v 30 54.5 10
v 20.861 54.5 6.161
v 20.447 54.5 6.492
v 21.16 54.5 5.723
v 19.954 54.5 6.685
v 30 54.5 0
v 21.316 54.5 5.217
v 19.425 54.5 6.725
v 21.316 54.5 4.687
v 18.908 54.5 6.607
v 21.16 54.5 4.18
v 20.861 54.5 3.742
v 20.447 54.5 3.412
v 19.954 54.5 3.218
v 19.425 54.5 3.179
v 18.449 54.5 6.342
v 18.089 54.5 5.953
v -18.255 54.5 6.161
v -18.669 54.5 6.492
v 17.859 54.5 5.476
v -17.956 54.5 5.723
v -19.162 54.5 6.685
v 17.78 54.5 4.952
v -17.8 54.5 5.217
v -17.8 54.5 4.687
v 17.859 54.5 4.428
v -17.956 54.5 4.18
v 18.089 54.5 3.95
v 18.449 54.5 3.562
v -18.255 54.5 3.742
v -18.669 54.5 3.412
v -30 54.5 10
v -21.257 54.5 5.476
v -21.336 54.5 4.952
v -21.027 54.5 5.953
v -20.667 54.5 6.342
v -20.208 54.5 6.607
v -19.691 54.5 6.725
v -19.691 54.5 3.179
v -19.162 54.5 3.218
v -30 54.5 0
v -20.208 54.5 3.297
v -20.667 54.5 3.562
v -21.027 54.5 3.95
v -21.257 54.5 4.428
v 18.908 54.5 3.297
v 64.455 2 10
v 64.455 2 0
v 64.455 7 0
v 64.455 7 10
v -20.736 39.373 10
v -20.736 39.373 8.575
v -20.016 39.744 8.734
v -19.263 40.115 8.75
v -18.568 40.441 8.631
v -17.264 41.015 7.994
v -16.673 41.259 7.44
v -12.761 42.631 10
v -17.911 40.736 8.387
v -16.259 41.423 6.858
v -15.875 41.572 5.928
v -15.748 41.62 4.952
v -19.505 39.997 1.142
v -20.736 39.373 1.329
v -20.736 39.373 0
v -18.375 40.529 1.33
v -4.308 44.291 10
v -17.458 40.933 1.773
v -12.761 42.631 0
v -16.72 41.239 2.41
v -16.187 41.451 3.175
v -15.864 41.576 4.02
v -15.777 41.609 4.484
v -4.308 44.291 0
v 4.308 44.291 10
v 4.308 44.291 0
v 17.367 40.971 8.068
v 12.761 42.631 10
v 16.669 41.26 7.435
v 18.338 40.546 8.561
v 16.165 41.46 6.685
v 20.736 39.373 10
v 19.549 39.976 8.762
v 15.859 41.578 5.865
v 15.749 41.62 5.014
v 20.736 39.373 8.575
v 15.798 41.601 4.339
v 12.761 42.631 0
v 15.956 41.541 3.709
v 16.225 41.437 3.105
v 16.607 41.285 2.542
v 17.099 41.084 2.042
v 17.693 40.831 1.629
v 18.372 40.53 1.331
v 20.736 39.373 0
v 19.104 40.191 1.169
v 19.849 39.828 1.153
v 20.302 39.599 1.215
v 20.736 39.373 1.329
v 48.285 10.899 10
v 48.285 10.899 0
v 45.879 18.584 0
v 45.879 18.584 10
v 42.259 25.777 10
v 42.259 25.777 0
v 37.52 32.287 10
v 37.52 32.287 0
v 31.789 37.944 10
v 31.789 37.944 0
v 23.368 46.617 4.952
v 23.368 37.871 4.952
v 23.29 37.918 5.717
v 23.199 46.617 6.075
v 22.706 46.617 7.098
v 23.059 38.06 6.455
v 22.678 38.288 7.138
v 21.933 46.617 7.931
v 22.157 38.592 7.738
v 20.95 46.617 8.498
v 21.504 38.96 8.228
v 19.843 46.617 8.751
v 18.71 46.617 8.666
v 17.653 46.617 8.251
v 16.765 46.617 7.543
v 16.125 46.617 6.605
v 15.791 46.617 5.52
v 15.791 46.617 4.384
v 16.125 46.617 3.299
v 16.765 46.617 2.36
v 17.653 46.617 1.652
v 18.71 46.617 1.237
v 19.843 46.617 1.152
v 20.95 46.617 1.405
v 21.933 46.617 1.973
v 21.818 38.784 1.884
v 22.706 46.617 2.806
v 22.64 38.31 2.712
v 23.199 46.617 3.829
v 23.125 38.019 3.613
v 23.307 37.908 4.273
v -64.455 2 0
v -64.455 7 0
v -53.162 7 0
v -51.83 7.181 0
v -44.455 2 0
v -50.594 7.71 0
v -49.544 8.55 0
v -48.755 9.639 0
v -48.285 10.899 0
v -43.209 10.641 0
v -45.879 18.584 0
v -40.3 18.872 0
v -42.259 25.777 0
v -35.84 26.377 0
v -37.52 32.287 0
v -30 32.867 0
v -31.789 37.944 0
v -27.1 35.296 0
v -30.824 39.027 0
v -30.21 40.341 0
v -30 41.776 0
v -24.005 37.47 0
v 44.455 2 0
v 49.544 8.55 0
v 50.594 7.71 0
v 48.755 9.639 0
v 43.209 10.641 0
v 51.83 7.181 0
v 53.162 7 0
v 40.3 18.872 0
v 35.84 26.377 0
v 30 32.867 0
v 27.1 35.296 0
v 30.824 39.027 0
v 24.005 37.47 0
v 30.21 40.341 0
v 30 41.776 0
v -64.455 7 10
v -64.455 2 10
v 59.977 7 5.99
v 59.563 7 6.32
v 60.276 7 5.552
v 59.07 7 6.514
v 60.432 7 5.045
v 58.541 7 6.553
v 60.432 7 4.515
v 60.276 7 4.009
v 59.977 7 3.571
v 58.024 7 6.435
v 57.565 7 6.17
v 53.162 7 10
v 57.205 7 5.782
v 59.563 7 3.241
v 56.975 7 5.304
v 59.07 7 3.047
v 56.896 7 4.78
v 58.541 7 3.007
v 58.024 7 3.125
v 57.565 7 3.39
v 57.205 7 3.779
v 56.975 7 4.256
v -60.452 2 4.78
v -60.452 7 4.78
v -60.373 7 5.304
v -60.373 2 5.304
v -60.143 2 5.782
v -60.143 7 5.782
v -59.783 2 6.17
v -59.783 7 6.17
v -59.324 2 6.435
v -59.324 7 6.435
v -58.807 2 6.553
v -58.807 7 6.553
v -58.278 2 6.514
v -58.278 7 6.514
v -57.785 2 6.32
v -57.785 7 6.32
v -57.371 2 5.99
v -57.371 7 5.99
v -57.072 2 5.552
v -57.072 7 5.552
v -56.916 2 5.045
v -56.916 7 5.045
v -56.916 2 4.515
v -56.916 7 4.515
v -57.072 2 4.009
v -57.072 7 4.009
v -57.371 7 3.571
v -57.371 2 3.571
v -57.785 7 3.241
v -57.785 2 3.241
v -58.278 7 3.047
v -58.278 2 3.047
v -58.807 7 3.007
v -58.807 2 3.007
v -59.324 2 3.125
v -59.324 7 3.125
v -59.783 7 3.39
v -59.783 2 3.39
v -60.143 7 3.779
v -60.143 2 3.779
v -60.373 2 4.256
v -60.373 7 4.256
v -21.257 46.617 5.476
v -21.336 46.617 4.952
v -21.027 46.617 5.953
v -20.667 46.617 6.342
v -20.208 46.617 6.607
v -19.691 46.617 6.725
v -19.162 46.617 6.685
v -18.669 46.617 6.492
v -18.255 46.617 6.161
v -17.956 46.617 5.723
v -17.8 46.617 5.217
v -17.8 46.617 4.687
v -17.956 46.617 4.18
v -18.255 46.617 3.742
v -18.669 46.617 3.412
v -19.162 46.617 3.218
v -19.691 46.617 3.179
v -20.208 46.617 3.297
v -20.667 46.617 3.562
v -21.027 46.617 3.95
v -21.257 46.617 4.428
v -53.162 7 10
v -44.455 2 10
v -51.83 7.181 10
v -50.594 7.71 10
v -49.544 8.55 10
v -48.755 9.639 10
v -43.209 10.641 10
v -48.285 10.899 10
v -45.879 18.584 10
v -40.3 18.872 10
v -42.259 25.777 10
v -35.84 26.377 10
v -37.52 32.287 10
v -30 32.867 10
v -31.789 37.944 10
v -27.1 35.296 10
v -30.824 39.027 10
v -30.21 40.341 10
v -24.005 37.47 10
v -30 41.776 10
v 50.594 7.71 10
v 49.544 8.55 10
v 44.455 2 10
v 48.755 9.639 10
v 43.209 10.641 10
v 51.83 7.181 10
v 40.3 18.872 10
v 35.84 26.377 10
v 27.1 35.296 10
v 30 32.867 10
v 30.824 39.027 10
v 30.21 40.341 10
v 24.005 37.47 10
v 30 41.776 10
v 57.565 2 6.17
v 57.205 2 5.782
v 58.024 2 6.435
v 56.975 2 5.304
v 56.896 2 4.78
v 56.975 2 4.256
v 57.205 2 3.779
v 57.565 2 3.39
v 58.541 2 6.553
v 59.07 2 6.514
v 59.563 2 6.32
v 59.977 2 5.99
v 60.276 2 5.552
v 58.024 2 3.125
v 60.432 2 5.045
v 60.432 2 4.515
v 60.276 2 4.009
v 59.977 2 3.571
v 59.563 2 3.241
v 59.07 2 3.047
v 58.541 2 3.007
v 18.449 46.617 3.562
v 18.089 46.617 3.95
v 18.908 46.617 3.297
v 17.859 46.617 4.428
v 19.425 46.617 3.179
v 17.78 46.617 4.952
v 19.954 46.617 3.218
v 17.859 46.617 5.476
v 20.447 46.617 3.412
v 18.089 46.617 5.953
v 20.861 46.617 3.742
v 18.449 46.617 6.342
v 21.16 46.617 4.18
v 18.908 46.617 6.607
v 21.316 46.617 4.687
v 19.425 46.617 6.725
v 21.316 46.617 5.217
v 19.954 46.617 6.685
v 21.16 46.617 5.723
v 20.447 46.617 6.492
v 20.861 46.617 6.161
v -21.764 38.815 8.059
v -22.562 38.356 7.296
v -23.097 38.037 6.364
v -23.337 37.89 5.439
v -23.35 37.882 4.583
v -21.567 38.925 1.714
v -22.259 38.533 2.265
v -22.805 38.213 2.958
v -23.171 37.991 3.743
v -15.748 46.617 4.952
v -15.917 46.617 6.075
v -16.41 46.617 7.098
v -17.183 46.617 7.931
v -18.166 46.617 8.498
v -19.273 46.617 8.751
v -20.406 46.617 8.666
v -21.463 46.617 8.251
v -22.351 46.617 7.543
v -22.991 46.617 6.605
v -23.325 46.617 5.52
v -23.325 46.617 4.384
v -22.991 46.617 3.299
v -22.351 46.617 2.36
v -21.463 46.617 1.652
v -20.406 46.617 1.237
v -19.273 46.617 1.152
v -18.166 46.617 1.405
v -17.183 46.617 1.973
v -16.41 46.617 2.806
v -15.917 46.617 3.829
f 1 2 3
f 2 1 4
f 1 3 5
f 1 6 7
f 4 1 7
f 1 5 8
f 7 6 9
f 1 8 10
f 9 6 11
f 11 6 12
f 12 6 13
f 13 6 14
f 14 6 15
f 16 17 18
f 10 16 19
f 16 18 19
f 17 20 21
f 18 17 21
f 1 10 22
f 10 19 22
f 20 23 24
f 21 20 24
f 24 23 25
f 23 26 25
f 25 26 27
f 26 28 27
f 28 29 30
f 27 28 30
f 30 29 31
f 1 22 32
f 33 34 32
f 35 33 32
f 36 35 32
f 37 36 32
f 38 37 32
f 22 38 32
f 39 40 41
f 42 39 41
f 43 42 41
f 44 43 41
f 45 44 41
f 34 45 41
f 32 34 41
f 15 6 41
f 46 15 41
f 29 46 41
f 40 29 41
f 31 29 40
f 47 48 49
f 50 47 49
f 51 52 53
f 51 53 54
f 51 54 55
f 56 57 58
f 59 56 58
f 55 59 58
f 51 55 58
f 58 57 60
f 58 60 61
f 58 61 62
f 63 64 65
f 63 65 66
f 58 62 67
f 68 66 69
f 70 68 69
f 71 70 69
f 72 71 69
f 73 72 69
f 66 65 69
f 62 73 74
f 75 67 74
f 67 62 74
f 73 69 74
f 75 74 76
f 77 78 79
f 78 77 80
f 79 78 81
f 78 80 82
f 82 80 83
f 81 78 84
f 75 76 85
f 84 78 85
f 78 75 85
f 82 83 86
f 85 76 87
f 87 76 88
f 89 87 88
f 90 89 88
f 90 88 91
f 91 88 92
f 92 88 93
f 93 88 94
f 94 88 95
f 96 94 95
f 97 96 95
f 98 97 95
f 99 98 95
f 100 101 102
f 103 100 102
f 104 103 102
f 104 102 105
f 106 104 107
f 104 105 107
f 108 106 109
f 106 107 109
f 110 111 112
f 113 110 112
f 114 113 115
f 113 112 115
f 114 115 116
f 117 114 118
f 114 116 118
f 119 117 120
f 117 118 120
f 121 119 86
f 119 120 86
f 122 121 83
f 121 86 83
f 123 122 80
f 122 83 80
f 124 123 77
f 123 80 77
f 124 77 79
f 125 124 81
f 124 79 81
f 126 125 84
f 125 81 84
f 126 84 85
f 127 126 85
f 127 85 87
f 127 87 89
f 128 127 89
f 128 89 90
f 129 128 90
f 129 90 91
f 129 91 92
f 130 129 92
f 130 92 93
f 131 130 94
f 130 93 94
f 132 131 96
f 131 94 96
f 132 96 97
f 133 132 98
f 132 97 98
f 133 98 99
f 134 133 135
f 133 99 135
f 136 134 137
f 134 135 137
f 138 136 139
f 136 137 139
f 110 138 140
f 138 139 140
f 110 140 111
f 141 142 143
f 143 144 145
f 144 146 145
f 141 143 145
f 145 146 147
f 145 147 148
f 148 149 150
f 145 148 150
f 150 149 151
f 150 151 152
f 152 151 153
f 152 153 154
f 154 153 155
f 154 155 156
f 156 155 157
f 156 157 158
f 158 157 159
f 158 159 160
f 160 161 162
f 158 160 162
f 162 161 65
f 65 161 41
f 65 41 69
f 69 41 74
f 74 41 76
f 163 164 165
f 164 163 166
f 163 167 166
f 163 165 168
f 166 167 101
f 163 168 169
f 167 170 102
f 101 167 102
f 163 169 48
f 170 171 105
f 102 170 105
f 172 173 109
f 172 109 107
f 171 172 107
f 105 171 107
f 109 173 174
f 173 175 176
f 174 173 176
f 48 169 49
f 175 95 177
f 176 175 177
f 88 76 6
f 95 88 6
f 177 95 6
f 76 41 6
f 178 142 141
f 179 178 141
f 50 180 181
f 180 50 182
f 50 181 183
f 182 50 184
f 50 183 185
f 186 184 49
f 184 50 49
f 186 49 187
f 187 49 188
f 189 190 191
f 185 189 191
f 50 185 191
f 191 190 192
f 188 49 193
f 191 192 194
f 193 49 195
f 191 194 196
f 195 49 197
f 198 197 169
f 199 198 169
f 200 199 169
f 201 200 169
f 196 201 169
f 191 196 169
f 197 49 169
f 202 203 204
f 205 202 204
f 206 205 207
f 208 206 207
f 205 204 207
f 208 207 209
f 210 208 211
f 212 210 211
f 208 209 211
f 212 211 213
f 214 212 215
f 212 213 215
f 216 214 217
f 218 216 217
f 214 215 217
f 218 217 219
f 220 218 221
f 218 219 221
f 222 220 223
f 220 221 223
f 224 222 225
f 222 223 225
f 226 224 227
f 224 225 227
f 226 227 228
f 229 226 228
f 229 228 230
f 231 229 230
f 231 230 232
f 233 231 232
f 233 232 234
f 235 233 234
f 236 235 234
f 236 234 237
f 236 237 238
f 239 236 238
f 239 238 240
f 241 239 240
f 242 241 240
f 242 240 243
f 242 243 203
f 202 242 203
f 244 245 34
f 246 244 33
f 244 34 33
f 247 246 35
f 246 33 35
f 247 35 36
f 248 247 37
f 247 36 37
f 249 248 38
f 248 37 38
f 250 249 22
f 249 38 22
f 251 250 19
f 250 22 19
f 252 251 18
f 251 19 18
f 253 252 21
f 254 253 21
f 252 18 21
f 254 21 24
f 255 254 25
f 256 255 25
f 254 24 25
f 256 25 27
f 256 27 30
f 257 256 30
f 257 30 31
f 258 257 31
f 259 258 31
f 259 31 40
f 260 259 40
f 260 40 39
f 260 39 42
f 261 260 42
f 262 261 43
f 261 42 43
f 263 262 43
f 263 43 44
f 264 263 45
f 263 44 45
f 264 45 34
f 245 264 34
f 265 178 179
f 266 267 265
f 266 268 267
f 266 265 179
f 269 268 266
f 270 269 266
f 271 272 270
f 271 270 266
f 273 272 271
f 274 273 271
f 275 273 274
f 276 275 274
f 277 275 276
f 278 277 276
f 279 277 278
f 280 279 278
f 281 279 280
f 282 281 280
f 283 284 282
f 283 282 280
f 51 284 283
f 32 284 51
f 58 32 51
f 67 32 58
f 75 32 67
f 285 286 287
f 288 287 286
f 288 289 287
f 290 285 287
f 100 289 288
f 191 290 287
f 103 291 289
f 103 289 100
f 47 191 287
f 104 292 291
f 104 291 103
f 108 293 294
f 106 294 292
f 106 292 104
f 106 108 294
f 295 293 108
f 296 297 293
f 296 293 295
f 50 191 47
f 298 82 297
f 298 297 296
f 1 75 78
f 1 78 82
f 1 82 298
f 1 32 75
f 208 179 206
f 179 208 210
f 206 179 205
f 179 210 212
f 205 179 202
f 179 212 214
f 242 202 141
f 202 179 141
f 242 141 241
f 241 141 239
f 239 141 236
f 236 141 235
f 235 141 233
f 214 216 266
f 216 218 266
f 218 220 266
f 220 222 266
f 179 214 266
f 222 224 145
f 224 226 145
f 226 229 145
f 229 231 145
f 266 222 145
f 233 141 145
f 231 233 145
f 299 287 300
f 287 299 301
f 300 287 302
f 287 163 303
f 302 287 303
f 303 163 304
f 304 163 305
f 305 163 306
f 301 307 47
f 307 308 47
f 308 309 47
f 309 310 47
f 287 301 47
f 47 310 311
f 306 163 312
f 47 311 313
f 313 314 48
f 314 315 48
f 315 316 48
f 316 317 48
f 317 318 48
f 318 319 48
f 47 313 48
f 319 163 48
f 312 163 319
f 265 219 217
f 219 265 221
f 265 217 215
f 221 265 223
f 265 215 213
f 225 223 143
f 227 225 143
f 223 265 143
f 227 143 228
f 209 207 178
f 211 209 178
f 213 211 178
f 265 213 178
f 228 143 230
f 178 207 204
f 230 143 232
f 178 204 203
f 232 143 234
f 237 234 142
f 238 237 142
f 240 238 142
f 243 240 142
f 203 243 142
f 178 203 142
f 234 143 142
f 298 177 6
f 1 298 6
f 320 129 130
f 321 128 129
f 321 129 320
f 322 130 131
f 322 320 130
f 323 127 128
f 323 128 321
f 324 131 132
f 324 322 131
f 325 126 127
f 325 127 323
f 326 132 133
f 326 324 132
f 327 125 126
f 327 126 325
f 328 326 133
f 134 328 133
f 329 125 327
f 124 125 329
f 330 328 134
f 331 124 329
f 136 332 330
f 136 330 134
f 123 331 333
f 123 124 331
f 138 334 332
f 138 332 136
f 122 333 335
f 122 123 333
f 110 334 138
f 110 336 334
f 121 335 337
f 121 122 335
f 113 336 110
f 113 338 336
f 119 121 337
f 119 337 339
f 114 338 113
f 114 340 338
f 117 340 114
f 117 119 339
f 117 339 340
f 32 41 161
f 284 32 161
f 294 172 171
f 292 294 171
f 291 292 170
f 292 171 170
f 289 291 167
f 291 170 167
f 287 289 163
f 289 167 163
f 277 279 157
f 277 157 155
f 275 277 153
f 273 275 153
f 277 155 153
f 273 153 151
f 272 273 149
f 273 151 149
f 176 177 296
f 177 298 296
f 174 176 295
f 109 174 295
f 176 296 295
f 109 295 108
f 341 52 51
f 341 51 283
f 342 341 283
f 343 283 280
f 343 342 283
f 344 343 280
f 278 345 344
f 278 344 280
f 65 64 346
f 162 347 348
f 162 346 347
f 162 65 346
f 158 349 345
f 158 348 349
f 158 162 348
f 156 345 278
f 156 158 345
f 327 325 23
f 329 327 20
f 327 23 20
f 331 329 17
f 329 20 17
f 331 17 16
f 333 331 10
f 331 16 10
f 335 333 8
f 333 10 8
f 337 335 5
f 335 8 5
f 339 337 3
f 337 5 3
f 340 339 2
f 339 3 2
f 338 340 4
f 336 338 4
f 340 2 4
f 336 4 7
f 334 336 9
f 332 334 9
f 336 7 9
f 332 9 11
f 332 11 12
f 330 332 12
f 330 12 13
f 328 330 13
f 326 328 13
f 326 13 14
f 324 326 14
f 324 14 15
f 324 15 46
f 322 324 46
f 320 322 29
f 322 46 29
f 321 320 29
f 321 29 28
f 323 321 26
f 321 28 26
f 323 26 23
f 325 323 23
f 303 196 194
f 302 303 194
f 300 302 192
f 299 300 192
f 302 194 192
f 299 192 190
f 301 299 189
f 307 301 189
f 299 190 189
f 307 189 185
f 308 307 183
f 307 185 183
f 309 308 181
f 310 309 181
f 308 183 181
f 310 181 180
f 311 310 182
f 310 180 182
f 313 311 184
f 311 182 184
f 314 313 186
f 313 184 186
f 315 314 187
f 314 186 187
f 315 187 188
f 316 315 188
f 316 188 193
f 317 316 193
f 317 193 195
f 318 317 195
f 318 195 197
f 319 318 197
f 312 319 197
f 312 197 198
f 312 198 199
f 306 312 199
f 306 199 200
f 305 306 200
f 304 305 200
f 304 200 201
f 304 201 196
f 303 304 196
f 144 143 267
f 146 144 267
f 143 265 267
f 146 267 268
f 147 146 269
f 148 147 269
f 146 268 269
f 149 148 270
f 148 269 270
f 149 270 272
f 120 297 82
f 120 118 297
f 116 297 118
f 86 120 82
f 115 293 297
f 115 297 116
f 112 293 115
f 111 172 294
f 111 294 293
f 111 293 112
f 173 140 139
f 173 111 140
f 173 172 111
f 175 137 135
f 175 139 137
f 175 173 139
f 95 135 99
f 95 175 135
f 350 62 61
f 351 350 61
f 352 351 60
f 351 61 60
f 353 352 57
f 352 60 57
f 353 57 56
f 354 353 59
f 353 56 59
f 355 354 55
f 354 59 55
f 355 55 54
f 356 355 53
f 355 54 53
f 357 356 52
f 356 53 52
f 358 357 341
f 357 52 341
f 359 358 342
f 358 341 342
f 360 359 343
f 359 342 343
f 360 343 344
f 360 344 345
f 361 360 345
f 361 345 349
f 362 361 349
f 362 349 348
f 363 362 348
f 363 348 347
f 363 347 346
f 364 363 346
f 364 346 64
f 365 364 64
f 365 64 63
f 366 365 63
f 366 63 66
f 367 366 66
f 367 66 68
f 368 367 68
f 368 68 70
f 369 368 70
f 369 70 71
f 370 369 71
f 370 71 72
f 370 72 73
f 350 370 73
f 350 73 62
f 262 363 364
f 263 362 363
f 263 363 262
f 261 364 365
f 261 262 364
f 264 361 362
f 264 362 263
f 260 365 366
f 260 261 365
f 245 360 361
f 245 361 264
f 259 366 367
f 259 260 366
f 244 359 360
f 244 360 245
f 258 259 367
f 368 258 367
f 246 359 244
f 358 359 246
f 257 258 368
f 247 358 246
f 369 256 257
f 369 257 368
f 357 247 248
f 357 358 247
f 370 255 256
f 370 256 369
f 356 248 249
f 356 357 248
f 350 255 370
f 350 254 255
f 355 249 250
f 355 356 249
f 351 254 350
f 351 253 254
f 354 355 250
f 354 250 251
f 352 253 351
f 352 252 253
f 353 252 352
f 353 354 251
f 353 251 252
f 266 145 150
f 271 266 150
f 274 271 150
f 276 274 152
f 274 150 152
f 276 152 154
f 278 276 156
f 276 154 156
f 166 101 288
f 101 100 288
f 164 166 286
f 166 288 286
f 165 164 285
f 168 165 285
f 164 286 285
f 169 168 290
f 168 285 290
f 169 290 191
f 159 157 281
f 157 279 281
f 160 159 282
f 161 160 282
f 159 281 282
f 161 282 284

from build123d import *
from build123d import SkipClean  # not in build123d's __all__

# Parameters (mm, degrees)
F1_DEPTH       = 10
F3_D           = 3.556
F3_CBORE_D     = 7.62
F3_CBORE_DEPTH = 13.75
F4_DEPTH       = 10.0010001
F6_D           = 3.556
F7_R           = 5


with BuildPart() as f1:
    # F0 (on Top) → F1 (new body)
    with BuildSketch(Plane.XY):
        with BuildLine():
            ThreePointArc((30, 32.8671568591), (40.2999174323, 18.8723780946), (44.4550334608, 2))
            Line((44.4550334608, 2), (44.4550334608, 7))
            Line((44.4550334608, 7), (49.002550954, 7))
            ThreePointArc((49.002550954, 7), (42.6890737127, 25.0577929106), (30, 39.3732142452))
            Line((30, 39.3732142452), (30, 32.8671568591))
        make_face()
        with BuildLine():
            ThreePointArc((20.7364413533, 39.3732142452), (25.5759421328, 36.4159468368), (30, 32.8671568591))
            Line((30, 32.8671568591), (30, 39.3732142452))
            Line((30, 39.3732142452), (20.7364413533, 39.3732142452))
        make_face()
        with BuildLine():
            ThreePointArc((-20.7364413533, 39.3732142452), (0, 44.5), (20.7364413533, 39.3732142452))
            Line((20.7364413533, 39.3732142452), (30, 39.3732142452))
            ThreePointArc((30, 39.3732142452), (15.8315491079, 46.9000218853), (-1.83e-08, 49.5))
            ThreePointArc((-1.83e-08, 49.5), (-15.8315491253, 46.9000218795), (-30, 39.3732142452))
            Line((-30, 39.3732142452), (-20.7364413533, 39.3732142452))
        make_face()
        with BuildLine():
            Line((-30, 39.3732142452), (-30, 32.8671568591))
            ThreePointArc((-30, 32.8671568591), (-25.5759421328, 36.4159468368), (-20.7364413533, 39.3732142452))
            Line((-20.7364413533, 39.3732142452), (-30, 39.3732142452))
        make_face()
        with BuildLine():
            ThreePointArc((-44.4550334608, 2), (-40.2999174323, 18.8723780946), (-30, 32.8671568591))
            Line((-30, 32.8671568591), (-30, 39.3732142452))
            ThreePointArc((-30, 39.3732142452), (-42.6890737127, 25.0577929106), (-49.002550954, 7))
            Line((-49.002550954, 7), (-44.4550334608, 7))
            Line((-44.4550334608, 7), (-44.4550334608, 2))
        make_face()
        with BuildLine():
            Line((-64.4550334608, 2), (-49.4595794564, 2))
            ThreePointArc((-49.4595794564, 2), (-49.2945005172, 4.5057983491), (-49.002550954, 7))
            Line((-49.002550954, 7), (-64.4550334608, 7))
            Line((-64.4550334608, 7), (-64.4550334608, 2))
        make_face()
        with BuildLine():
            Line((-49.4595794564, 2), (-44.4550334608, 2))
            Line((-44.4550334608, 2), (-44.4550334608, 7))
            Line((-44.4550334608, 7), (-49.002550954, 7))
            ThreePointArc((-49.002550954, 7), (-49.2945005172, 4.5057983491), (-49.4595794564, 2))
        make_face()
        with BuildLine():
            Line((44.4550334608, 7), (44.4550334608, 2))
            Line((44.4550334608, 2), (49.4595794564, 2))
            ThreePointArc((49.4595794564, 2), (49.2945005172, 4.5057983491), (49.002550954, 7))
            Line((49.002550954, 7), (44.4550334608, 7))
        make_face()
        with BuildLine():
            ThreePointArc((49.002550954, 7), (49.2945005172, 4.5057983491), (49.4595794564, 2))
            Line((49.4595794564, 2), (64.4550334608, 2))
            Line((64.4550334608, 2), (64.4550334608, 7))
            Line((64.4550334608, 7), (49.002550954, 7))
        make_face()
        with BuildLine():
            Line((-30, 49.5), (-30, 39.3732142452))
            ThreePointArc((-30, 39.3732142452), (-15.8315491253, 46.9000218795), (-1.83e-08, 49.5))
            Line((-1.83e-08, 49.5), (-30, 49.5))
        make_face()
        with BuildLine():
            ThreePointArc((-1.83e-08, 49.5), (15.8315491079, 46.9000218853), (30, 39.3732142452))
            Line((30, 39.3732142452), (30, 49.5))
            Line((30, 49.5), (-1.83e-08, 49.5))
        make_face()
        with BuildLine():
            Line((-30, 32.8671568591), (30, 32.8671568591))
            ThreePointArc((30, 32.8671568591), (25.5759421328, 36.4159468368), (20.7364413533, 39.3732142452))
            Line((20.7364413533, 39.3732142452), (-20.7364413533, 39.3732142452))
            ThreePointArc((-20.7364413533, 39.3732142452), (-25.5759421328, 36.4159468368), (-30, 32.8671568591))
        make_face()
        Polygon((-30, 49.5), (-1.83e-08, 49.5), (30, 49.5), (30, 54.5), (-30, 54.5), align=None)
    extrude(amount=F1_DEPTH)

    # F3 (through all)
    with Locations(Plane.XZ.offset(-32.8671568591)):
        with Locations((-19.558, 4.9517820589), (19.558, 4.9517820589)):
            CounterBoreHole(F3_D / 2, F3_CBORE_D / 2, F3_CBORE_DEPTH)

    # F0 (on Top) → F4 (cut, through all)
    with BuildSketch(Plane.XY):
        with BuildLine():
            Line((-30, 32.8671568591), (30, 32.8671568591))
            ThreePointArc((30, 32.8671568591), (25.5759421328, 36.4159468368), (20.7364413533, 39.3732142452))
            Line((20.7364413533, 39.3732142452), (-20.7364413533, 39.3732142452))
            ThreePointArc((-20.7364413533, 39.3732142452), (-25.5759421328, 36.4159468368), (-30, 32.8671568591))
        make_face()
    with SkipClean():  # cleaning this boolean's faces spoils the solid; the shape is the same uncleaned
        extrude(amount=F4_DEPTH, mode=Mode.SUBTRACT)

    # F6 (through all)
    with Locations(Plane.XZ.offset(-2)):
        with Locations((-58.674, 4.78035165), (58.674, 4.78035165)):
            Hole(F6_D / 2)

    # F7
    f7_edges = [f1.edges().sort_by_distance(p)[0] for p in [
        (-49.002551, 7, 5),
        (49.002551, 7, 5),
        (30, 39.373214, 5),
        (-30, 39.373214, 5),
    ]]
    fillet(f7_edges, radius=F7_R)


solid = f1.part
